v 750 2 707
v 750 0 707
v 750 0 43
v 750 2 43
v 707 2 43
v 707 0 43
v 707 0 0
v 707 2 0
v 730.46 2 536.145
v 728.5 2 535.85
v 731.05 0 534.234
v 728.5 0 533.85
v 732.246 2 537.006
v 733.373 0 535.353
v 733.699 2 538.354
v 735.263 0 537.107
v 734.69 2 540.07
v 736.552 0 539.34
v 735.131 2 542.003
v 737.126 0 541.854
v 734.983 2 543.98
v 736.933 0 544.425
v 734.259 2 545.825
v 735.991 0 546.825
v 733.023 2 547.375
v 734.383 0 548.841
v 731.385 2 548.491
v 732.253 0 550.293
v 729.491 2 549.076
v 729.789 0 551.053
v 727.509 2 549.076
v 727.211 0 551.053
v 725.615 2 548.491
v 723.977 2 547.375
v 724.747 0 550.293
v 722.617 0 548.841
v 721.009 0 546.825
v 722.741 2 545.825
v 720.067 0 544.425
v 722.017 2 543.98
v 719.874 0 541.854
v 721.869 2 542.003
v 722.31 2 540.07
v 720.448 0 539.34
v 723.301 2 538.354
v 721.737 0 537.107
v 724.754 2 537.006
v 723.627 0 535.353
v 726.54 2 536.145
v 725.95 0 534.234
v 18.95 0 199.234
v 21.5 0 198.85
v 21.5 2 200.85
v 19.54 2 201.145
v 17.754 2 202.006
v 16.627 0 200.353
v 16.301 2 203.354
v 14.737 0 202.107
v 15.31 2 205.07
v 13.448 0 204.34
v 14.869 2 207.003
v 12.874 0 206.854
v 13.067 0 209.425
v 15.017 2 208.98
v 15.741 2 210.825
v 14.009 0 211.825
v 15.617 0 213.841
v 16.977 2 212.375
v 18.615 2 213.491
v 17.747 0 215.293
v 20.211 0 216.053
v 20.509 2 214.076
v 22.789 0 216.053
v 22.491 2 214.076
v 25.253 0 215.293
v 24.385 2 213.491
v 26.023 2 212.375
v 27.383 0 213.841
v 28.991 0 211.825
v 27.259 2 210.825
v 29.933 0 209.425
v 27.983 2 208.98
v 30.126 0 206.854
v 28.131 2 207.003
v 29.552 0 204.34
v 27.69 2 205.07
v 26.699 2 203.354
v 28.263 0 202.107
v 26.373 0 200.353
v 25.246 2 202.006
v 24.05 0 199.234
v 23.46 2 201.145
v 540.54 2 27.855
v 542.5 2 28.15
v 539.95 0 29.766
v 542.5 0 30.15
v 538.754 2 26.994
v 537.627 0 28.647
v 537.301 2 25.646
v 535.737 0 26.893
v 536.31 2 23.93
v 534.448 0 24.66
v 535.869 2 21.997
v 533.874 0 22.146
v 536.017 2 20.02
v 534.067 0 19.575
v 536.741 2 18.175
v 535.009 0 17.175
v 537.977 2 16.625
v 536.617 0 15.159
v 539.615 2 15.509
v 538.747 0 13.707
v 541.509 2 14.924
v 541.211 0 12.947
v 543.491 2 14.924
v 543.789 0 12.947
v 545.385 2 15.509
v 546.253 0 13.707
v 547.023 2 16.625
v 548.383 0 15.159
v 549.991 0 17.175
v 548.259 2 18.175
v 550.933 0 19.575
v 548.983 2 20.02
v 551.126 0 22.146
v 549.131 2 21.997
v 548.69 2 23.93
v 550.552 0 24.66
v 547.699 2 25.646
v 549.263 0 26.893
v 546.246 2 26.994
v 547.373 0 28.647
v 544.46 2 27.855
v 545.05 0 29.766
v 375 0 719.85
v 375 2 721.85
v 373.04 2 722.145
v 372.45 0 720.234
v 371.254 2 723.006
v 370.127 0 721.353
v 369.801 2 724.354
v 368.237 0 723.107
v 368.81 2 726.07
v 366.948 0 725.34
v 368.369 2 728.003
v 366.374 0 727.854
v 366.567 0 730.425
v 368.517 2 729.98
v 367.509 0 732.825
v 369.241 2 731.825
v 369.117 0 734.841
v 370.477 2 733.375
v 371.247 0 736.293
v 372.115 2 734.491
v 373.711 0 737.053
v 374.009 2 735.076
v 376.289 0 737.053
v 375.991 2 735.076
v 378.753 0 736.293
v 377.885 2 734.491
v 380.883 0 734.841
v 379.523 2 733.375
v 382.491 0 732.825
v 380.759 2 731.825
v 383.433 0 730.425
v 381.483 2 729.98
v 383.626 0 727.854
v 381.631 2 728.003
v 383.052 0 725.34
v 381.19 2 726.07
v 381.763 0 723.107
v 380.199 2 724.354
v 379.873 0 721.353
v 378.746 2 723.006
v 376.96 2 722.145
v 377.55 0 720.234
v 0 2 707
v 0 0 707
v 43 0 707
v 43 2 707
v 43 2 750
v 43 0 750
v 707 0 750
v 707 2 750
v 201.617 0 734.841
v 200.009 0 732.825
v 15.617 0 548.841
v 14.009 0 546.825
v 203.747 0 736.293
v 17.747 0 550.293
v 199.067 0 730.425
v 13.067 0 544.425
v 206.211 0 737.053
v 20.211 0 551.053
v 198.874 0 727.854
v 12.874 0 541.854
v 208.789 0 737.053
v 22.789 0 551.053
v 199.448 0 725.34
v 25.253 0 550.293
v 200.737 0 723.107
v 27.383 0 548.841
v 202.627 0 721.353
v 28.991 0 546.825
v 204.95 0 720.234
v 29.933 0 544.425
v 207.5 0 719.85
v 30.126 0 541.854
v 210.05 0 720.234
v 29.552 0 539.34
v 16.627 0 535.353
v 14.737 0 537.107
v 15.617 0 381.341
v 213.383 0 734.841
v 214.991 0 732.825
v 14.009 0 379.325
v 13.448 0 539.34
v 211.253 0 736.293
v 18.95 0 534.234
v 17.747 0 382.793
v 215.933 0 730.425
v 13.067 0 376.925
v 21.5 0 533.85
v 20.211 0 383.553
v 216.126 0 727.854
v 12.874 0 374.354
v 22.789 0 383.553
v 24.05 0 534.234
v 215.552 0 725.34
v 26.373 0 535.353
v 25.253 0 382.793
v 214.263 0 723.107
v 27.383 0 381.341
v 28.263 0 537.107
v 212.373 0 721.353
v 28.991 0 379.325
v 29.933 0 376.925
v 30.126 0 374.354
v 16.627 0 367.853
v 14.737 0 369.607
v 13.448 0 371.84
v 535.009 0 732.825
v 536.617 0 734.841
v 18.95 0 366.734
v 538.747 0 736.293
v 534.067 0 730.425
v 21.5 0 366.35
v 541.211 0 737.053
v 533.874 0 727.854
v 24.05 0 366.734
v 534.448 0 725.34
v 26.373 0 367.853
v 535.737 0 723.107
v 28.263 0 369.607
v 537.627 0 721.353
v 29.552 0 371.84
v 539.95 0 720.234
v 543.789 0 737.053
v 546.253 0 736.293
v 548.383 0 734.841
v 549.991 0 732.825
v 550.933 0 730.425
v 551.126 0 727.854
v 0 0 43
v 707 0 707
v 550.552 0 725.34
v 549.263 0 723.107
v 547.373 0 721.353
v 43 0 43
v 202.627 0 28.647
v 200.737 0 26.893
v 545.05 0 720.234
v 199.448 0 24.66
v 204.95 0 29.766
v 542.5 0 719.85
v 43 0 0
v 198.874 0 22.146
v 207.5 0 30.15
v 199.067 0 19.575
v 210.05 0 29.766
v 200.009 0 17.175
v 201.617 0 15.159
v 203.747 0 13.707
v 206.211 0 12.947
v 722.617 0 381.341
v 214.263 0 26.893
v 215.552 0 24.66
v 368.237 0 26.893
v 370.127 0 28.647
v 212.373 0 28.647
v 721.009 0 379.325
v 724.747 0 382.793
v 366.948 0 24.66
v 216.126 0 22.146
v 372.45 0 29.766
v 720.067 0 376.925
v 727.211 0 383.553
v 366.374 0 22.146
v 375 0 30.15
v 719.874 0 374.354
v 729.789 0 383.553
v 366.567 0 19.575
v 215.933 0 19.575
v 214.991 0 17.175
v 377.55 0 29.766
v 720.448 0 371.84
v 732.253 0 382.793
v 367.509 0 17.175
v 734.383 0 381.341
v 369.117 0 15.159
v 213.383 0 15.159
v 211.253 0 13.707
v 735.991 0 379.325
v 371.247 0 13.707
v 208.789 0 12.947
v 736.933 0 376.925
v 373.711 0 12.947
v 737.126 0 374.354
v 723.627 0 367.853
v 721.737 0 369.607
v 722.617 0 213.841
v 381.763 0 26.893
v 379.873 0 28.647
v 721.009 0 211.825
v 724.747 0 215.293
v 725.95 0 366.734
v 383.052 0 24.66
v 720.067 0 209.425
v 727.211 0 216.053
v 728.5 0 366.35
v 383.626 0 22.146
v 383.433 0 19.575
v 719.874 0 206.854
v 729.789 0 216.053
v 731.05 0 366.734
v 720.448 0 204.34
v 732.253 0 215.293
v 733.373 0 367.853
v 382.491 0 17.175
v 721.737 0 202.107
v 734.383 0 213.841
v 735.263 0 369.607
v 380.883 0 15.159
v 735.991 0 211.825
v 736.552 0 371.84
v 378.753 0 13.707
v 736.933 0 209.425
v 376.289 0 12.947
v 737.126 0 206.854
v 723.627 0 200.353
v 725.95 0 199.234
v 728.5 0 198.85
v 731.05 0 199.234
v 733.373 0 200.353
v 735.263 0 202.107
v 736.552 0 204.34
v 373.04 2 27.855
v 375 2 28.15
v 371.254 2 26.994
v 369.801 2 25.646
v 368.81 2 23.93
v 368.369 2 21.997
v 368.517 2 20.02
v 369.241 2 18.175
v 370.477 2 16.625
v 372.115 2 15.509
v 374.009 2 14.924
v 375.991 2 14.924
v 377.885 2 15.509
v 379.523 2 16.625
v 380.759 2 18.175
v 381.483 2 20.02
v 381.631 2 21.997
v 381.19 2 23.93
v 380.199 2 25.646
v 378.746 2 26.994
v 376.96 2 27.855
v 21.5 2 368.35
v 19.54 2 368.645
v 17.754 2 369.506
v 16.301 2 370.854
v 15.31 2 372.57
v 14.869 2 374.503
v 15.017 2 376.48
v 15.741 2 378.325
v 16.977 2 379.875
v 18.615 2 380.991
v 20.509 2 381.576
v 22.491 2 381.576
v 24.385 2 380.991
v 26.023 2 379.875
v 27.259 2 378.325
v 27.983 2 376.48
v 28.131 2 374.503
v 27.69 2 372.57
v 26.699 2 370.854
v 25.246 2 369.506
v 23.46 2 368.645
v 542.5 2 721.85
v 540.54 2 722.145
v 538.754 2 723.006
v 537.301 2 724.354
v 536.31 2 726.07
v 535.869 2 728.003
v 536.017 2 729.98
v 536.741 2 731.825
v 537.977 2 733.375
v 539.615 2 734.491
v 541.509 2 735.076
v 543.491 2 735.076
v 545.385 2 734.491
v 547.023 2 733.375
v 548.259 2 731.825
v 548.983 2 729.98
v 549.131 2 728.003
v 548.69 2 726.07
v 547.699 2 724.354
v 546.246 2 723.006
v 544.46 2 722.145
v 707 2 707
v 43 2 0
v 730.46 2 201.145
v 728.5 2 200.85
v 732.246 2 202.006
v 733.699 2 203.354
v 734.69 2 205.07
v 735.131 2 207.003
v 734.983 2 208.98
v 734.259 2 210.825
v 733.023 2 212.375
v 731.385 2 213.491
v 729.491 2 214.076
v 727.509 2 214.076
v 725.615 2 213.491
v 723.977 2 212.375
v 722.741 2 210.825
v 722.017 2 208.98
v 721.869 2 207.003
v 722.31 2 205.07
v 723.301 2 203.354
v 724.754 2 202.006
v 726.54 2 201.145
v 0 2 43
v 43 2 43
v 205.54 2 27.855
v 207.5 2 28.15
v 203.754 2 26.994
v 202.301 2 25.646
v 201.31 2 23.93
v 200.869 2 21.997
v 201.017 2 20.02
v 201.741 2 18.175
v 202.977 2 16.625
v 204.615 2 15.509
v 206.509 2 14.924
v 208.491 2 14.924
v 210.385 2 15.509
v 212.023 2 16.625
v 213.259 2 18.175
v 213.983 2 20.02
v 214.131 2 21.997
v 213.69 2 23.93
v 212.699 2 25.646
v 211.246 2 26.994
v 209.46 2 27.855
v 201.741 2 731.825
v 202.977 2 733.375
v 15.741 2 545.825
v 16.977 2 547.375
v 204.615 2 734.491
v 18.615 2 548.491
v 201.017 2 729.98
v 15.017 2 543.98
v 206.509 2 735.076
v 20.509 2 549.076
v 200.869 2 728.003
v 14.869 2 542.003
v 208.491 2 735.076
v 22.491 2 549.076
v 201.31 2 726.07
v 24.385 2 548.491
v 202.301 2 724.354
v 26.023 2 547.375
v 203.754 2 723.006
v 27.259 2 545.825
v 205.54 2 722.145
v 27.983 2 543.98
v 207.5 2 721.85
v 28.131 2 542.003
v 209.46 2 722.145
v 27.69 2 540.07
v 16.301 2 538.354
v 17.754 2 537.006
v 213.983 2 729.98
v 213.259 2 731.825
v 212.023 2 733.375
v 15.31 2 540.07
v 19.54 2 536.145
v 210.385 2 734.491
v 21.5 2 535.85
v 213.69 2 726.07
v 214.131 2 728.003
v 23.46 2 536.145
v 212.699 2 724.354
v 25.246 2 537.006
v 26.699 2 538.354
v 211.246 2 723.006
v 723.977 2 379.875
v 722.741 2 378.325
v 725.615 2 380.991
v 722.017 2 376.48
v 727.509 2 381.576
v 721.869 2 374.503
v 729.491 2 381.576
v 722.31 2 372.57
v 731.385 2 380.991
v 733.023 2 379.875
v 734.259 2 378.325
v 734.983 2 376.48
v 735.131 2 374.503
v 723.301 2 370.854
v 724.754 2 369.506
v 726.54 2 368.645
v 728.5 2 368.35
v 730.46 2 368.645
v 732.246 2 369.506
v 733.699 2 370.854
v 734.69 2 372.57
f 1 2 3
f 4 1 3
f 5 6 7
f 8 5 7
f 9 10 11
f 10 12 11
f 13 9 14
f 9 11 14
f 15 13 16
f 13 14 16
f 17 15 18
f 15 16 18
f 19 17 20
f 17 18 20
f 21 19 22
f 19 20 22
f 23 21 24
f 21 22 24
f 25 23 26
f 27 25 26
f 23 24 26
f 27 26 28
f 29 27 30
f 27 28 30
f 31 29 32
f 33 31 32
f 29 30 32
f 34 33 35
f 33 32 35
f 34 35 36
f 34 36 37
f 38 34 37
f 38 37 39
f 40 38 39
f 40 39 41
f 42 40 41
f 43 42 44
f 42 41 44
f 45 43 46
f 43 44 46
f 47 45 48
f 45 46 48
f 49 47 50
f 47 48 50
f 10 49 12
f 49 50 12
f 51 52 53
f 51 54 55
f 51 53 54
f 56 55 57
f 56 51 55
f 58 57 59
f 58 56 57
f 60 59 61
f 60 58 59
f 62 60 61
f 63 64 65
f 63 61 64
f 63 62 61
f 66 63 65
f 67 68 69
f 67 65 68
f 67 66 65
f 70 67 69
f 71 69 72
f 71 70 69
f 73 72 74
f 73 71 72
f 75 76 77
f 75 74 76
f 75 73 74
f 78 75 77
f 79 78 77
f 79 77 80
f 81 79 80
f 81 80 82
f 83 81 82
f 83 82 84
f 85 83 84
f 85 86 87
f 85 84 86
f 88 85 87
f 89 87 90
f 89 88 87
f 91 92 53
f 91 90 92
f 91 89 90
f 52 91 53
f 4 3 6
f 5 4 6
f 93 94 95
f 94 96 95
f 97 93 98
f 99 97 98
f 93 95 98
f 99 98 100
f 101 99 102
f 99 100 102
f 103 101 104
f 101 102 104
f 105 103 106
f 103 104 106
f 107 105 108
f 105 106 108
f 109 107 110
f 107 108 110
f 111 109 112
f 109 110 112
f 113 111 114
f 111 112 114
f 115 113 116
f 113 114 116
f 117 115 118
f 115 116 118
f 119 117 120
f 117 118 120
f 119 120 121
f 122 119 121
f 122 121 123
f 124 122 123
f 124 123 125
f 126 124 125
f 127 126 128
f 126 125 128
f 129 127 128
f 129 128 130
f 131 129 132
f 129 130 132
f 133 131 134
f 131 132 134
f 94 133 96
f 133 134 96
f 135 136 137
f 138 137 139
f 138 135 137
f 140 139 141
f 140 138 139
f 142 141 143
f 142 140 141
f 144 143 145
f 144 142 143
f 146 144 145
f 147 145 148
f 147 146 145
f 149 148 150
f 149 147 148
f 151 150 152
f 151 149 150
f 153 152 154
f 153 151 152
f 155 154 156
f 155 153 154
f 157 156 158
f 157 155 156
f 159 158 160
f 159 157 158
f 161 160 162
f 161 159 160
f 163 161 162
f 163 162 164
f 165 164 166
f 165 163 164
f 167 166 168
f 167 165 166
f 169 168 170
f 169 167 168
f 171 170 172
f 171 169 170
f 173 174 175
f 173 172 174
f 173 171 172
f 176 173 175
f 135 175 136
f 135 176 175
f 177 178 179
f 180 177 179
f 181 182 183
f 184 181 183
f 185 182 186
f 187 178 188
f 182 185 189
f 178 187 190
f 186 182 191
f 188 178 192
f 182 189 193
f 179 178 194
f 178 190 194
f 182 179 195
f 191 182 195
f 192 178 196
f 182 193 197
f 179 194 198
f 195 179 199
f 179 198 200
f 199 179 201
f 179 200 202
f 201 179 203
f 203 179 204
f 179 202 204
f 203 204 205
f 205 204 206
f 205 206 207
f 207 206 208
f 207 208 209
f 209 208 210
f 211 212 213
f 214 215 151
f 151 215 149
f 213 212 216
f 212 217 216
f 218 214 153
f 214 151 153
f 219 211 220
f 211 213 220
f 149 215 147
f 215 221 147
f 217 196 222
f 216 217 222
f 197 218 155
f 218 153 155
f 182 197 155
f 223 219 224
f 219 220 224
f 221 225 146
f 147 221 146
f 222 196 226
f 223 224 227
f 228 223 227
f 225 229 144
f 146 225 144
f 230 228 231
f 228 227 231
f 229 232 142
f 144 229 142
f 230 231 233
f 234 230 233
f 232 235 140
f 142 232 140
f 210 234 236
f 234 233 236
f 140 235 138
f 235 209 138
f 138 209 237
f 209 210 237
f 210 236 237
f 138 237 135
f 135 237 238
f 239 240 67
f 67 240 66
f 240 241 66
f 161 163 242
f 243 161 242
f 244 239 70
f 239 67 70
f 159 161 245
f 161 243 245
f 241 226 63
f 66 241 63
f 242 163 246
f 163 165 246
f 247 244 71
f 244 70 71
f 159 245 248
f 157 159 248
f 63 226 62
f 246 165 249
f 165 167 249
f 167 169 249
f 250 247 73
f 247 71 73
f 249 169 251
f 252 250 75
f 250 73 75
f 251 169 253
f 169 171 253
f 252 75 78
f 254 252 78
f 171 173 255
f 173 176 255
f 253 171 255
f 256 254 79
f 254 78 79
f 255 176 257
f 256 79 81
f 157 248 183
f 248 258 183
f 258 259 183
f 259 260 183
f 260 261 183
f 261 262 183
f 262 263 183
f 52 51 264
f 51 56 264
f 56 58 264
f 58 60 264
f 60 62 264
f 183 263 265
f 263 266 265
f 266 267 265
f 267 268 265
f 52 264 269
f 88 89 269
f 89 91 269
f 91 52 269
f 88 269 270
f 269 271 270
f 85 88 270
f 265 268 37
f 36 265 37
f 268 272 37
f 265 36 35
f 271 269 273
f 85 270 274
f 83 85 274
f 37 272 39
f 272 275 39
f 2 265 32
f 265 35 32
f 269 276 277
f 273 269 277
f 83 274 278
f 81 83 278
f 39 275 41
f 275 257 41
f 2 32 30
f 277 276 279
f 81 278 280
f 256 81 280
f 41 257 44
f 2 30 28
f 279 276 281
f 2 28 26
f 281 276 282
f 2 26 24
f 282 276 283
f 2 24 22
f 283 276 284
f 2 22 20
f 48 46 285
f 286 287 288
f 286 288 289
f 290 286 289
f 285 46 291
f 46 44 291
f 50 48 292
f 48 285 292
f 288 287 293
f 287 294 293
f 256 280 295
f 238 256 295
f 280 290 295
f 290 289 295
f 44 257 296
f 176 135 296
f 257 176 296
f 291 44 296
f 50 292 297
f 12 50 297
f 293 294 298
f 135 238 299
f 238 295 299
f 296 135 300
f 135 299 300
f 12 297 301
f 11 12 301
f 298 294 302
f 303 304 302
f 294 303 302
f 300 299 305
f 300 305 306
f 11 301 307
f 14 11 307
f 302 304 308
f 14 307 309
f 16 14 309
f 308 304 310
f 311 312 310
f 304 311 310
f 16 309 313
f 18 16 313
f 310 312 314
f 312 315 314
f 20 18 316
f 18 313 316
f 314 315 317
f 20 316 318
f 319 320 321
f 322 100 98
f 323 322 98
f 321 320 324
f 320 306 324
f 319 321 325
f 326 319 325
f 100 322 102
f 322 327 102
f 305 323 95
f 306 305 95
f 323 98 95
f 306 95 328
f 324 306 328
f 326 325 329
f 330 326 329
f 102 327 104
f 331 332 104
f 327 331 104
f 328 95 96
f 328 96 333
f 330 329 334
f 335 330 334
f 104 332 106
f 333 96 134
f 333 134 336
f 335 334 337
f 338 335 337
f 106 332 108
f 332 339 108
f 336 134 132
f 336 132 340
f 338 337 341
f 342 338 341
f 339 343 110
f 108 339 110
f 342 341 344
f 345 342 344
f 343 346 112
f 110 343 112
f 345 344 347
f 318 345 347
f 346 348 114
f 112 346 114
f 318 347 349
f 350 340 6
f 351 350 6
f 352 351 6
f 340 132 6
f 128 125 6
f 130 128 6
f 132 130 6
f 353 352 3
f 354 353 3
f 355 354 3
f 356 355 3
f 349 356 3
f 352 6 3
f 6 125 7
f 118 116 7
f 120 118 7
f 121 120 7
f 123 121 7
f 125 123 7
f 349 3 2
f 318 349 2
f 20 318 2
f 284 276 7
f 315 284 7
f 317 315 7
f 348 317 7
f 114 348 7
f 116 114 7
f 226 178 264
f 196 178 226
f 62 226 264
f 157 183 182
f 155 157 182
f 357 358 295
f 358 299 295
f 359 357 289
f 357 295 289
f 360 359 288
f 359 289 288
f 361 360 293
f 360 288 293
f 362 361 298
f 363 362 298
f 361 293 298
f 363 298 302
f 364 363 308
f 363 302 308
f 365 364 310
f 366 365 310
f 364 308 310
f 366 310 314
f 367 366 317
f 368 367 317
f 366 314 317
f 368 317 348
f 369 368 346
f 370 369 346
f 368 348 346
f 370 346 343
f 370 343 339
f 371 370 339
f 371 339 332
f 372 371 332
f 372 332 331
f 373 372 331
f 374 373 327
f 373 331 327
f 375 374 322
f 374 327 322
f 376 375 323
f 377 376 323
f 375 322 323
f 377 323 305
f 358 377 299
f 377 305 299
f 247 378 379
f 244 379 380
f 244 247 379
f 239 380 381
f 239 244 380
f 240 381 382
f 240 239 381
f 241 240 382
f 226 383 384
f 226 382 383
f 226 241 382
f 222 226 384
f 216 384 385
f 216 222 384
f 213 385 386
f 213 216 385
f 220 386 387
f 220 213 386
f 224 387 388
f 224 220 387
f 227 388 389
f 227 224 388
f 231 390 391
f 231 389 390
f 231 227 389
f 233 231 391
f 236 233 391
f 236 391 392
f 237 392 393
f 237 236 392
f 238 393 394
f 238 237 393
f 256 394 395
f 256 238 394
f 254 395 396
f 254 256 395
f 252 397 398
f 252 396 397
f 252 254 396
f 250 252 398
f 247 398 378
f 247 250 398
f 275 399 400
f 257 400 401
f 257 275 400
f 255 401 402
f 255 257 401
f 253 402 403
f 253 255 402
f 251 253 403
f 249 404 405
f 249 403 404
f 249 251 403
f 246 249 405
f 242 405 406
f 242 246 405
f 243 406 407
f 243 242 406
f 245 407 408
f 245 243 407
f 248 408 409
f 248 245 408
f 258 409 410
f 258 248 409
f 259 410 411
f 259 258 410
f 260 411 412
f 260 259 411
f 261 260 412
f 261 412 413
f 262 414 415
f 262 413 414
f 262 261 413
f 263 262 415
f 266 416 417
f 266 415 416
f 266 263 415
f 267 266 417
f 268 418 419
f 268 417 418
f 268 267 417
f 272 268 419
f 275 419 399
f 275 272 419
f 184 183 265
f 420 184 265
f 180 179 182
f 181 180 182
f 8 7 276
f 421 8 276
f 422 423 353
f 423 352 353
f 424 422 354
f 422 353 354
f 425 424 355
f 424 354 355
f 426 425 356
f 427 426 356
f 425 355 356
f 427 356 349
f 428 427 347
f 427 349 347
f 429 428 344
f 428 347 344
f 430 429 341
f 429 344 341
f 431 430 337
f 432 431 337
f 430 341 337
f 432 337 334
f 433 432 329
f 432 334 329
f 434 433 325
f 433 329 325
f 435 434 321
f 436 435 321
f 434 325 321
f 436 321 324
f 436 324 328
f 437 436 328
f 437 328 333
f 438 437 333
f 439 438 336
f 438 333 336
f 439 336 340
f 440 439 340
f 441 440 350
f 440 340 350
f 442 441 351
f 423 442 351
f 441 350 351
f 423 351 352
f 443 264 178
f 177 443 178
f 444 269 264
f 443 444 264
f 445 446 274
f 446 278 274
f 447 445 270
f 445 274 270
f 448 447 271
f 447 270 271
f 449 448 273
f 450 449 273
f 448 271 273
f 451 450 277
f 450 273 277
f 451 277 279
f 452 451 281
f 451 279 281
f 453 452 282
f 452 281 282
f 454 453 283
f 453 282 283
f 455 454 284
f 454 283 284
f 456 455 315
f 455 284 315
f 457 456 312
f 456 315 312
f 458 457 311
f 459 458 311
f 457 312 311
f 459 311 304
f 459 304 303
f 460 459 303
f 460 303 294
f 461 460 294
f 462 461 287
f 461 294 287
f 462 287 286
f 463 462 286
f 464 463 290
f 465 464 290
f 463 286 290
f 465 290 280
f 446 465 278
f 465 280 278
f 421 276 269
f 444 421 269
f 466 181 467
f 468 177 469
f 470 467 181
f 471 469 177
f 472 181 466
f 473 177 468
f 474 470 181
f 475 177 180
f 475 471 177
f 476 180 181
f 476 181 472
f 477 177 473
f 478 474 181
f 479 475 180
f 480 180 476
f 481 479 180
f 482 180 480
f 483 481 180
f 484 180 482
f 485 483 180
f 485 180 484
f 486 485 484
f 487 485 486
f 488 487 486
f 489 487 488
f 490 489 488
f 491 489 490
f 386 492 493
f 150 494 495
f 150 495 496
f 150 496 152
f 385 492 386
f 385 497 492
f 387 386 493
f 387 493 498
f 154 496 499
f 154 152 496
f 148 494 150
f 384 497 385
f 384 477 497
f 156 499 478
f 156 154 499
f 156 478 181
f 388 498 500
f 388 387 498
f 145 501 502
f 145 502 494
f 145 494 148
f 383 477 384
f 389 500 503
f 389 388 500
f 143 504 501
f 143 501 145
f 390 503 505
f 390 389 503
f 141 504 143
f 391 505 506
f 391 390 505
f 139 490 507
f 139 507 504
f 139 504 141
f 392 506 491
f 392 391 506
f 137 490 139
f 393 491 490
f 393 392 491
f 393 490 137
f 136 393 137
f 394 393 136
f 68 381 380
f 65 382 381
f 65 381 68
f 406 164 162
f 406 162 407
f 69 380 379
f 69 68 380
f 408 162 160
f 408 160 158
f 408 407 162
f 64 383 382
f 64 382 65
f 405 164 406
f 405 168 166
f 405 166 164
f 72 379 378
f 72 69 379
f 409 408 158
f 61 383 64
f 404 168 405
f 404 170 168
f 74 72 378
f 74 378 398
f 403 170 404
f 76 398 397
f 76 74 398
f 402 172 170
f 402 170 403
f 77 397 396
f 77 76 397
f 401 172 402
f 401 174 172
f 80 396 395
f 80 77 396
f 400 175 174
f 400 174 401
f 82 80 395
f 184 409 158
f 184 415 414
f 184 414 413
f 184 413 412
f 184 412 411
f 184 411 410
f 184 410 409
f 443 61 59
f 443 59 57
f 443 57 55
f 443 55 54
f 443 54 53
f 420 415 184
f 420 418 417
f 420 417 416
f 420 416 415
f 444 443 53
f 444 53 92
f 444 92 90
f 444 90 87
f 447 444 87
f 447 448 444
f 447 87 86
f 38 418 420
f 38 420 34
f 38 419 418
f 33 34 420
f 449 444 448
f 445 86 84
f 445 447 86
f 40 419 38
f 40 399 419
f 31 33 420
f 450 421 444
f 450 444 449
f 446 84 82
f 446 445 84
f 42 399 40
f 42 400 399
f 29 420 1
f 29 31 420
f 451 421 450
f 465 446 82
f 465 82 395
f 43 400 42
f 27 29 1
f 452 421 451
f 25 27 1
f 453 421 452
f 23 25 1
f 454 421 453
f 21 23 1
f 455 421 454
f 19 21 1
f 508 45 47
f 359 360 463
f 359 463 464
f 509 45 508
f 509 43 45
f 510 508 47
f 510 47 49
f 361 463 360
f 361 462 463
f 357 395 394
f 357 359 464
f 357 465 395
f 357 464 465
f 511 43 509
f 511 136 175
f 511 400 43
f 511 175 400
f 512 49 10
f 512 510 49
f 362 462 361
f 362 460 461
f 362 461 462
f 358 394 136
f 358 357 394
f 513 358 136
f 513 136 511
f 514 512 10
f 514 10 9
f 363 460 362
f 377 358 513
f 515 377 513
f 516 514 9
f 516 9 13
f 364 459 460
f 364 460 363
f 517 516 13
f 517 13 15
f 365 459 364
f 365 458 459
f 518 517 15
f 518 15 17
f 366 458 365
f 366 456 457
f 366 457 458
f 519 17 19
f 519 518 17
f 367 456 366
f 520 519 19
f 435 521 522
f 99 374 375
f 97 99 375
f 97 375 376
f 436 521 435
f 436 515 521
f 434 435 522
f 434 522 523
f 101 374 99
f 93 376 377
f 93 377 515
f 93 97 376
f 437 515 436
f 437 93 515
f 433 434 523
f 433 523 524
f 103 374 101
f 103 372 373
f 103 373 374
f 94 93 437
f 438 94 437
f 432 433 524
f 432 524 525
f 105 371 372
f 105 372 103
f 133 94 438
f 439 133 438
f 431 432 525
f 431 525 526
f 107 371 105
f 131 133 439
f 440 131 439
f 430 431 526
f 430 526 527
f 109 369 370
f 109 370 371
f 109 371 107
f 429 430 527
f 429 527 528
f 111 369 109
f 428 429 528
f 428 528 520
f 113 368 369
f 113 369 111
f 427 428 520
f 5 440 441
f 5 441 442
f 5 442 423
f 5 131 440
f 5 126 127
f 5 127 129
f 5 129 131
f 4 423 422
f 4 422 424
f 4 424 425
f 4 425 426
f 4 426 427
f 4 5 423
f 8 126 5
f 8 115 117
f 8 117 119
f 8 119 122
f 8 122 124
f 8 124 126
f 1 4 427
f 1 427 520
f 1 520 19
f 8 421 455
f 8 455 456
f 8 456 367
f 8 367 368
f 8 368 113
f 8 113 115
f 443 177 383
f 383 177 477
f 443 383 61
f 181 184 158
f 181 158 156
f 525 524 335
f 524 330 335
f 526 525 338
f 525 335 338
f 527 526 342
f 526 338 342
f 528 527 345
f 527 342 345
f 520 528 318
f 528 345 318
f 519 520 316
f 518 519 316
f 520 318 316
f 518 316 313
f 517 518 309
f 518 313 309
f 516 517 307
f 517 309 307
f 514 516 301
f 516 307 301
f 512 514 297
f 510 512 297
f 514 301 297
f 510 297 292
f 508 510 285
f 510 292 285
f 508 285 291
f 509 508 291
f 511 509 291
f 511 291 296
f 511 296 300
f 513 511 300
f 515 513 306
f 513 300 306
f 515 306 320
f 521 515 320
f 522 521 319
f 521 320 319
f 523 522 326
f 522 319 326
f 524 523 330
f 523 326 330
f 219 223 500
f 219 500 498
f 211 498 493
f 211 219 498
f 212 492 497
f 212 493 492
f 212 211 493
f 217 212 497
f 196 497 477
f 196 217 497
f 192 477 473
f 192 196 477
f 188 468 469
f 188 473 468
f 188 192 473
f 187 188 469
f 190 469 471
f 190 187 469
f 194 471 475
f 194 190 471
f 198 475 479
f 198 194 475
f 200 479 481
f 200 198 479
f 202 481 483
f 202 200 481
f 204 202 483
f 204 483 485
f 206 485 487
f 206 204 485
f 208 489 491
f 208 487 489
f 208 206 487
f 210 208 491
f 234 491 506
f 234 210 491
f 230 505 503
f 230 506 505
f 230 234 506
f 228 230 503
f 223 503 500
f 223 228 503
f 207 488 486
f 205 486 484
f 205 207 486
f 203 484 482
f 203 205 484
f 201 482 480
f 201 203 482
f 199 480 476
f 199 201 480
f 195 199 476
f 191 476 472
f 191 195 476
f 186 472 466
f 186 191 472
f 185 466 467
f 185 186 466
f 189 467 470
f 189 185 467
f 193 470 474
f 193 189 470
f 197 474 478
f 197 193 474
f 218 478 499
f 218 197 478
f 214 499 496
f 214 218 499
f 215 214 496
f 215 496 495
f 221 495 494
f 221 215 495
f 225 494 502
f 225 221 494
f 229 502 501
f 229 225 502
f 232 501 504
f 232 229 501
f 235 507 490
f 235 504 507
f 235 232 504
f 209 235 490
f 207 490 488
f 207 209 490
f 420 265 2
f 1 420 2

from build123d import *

# Parameters (mm, degrees)
BOSS_EXTRUDE2_DEPTH                            = 2
CSK_FOR_M8_FLAT_HEAD_MACHINE_SCREW2_AT_2_COUNT = 2
CSK_FOR_M8_FLAT_HEAD_MACHINE_SCREW2_AT_2_PITCH = 167.5
CSK_FOR_M8_FLAT_HEAD_MACHINE_SCREW2_AT_3_COUNT = 2
CSK_FOR_M8_FLAT_HEAD_MACHINE_SCREW2_AT_3_PITCH = 167.5
CSK_FOR_M8_FLAT_HEAD_MACHINE_SCREW2_AT_4_COUNT = 2
CSK_FOR_M8_FLAT_HEAD_MACHINE_SCREW2_AT_4_PITCH = 399.447430834
CSK_FOR_M8_FLAT_HEAD_MACHINE_SCREW2_AT_5_COUNT = 2
CSK_FOR_M8_FLAT_HEAD_MACHINE_SCREW2_AT_5_PITCH = 629.605630534


with BuildPart() as part:
    # Sketch3 → Boss-Extrude2 (new body)
    with BuildSketch(Plane(origin=(0, 0, 0), x_dir=(1, 0, 0), z_dir=(0, 1, 0))):
        Polygon((750, -707), (750, -43), (707, -43), (707, 0), (43, 0), (43, -43), (0, -43), (0, -707), (43, -707), (43, -750), (707, -750), (707, -707), align=None)
    extrude(amount=BOSS_EXTRUDE2_DEPTH)

    # Sketch9 → CSK for M8 Flat Head Machine Screw1 (revolve, cut)
    with BuildSketch(Plane(origin=(21.5, 0, 375), x_dir=(0, 0, -1), z_dir=(1, 0, 0))):
        Polygon((0, 0), (0, 2), (4.5, 2), (4.5, 4.15), (8.65, 0), align=None)
    csk_for_m8_flat_head_machine_screw1 = revolve(axis=Axis((21.5, -6.35, 375), (0, 1, 0)), mode=Mode.SUBTRACT)

    # Sketch12 → CSK for M8 Flat Head Machine Screw2 (revolve, cut)
    with BuildSketch(Plane(origin=(375, 0, 728.5), x_dir=(0, 0, -1), z_dir=(1, 0, 0))):
        Polygon((0, 0), (0, 2), (4.5, 2), (4.5, 4.15), (8.65, 0), align=None)
    csk_for_m8_flat_head_machine_screw2 = revolve(axis=Axis((375, -6.35, 728.5), (0, 1, 0)), mode=Mode.SUBTRACT)

    # CSK for M8 Flat Head Machine Screw2 at 2: CSK for M8 Flat Head Machine Screw2 ×2
    with Locations(*[(i * CSK_FOR_M8_FLAT_HEAD_MACHINE_SCREW2_AT_2_PITCH, 0, 0) for i in range(1, CSK_FOR_M8_FLAT_HEAD_MACHINE_SCREW2_AT_2_COUNT)]):
        add(csk_for_m8_flat_head_machine_screw2, mode=Mode.SUBTRACT)

    # CSK for M8 Flat Head Machine Screw2 at 3: CSK for M8 Flat Head Machine Screw2 ×2
    with Locations(*[(-i * CSK_FOR_M8_FLAT_HEAD_MACHINE_SCREW2_AT_3_PITCH, 0, 0) for i in range(1, CSK_FOR_M8_FLAT_HEAD_MACHINE_SCREW2_AT_3_COUNT)]):
        add(csk_for_m8_flat_head_machine_screw2, mode=Mode.SUBTRACT)

    # CSK for M8 Flat Head Machine Screw2 at 4: CSK for M8 Flat Head Machine Screw2 ×2
    with Locations(*[Vector(-0.884972521, 0, -0.46564325) * (i * CSK_FOR_M8_FLAT_HEAD_MACHINE_SCREW2_AT_4_PITCH) for i in range(1, CSK_FOR_M8_FLAT_HEAD_MACHINE_SCREW2_AT_4_COUNT)]):
        add(csk_for_m8_flat_head_machine_screw2, mode=Mode.SUBTRACT)

    # CSK for M8 Flat Head Machine Screw2 at 5: CSK for M8 Flat Head Machine Screw2 ×2
    with Locations(*[Vector(-0.561462577, 0, -0.827502129) * (i * CSK_FOR_M8_FLAT_HEAD_MACHINE_SCREW2_AT_5_PITCH) for i in range(1, CSK_FOR_M8_FLAT_HEAD_MACHINE_SCREW2_AT_5_COUNT)]):
        add(csk_for_m8_flat_head_machine_screw2, mode=Mode.SUBTRACT)

    # Mirror1: CSK for M8 Flat Head Machine Screw1, CSK for M8 Flat Head Machine Screw2 across plane
    add(csk_for_m8_flat_head_machine_screw1.mirror(Plane.ZY.offset(-375)), mode=Mode.SUBTRACT)
    add(csk_for_m8_flat_head_machine_screw2.mirror(Plane.ZY.offset(-375)), mode=Mode.SUBTRACT)

    # Mirror1 copy 1 sketch → Mirror1 copy 1 (revolve, cut)
    with BuildSketch(Plane(origin=(207.5, 0, 728.5), x_dir=(0, 0, -1), z_dir=(-1, 0, 0))):
        Polygon((0, 0), (0, -2), (4.5, -2), (4.5, -4.15), (8.65, 0), align=None)
    revolve(axis=Axis((207.5, -6.35, 728.5), (0, -1, 0)), mode=Mode.SUBTRACT)

    # Mirror1 copy 2 sketch → Mirror1 copy 2 (revolve, cut)
    with BuildSketch(Plane(origin=(542.5, 0, 728.5), x_dir=(0, 0, -1), z_dir=(-1, 0, 0))):
        Polygon((0, 0), (0, -2), (4.5, -2), (4.5, -4.15), (8.65, 0), align=None)
    revolve(axis=Axis((542.5, -6.35, 728.5), (0, -1, 0)), mode=Mode.SUBTRACT)

    # Mirror1 copy 3 sketch → Mirror1 copy 3 (revolve, cut)
    with BuildSketch(Plane(origin=(728.5, 0, 542.5), x_dir=(0, 0, -1), z_dir=(-1, 0, 0))):
        Polygon((0, 0), (0, -2), (4.5, -2), (4.5, -4.15), (8.65, 0), align=None)
    revolve(axis=Axis((728.5, -6.35, 542.5), (0, -1, 0)), mode=Mode.SUBTRACT)

    # Mirror1 copy 4 sketch → Mirror1 copy 4 (revolve, cut)
    with BuildSketch(Plane(origin=(728.5, 0, 207.5), x_dir=(0, 0, -1), z_dir=(-1, 0, 0))):
        Polygon((0, 0), (0, -2), (4.5, -2), (4.5, -4.15), (8.65, 0), align=None)
    revolve(axis=Axis((728.5, -6.35, 207.5), (0, -1, 0)), mode=Mode.SUBTRACT)

    # Mirror2: CSK for M8 Flat Head Machine Screw2 across plane
    add(csk_for_m8_flat_head_machine_screw2.mirror(Plane.XY.offset(375)), mode=Mode.SUBTRACT)

    # Mirror2 copy 1 sketch → Mirror2 copy 1 (revolve, cut)
    with BuildSketch(Plane(origin=(542.5, 0, 21.5), x_dir=(0, 0, 1), z_dir=(1, 0, 0))):
        Polygon((0, 0), (0, -2), (4.5, -2), (4.5, -4.15), (8.65, 0), align=None)
    revolve(axis=Axis((542.5, -6.35, 21.5), (0, -1, 0)), mode=Mode.SUBTRACT)

    # Mirror2 copy 2 sketch → Mirror2 copy 2 (revolve, cut)
    with BuildSketch(Plane(origin=(207.5, 0, 21.5), x_dir=(0, 0, 1), z_dir=(1, 0, 0))):
        Polygon((0, 0), (0, -2), (4.5, -2), (4.5, -4.15), (8.65, 0), align=None)
    revolve(axis=Axis((207.5, -6.35, 21.5), (0, -1, 0)), mode=Mode.SUBTRACT)

    # Mirror2 copy 3 sketch → Mirror2 copy 3 (revolve, cut)
    with BuildSketch(Plane(origin=(21.5, 0, 207.5), x_dir=(0, 0, 1), z_dir=(1, 0, 0))):
        Polygon((0, 0), (0, -2), (4.5, -2), (4.5, -4.15), (8.65, 0), align=None)
    revolve(axis=Axis((21.5, -6.35, 207.5), (0, -1, 0)), mode=Mode.SUBTRACT)

    # Mirror2 copy 4 sketch → Mirror2 copy 4 (revolve, cut)
    with BuildSketch(Plane(origin=(21.5, 0, 542.5), x_dir=(0, 0, 1), z_dir=(1, 0, 0))):
        Polygon((0, 0), (0, -2), (4.5, -2), (4.5, -4.15), (8.65, 0), align=None)
    revolve(axis=Axis((21.5, -6.35, 542.5), (0, -1, 0)), mode=Mode.SUBTRACT)


solid = part.part
